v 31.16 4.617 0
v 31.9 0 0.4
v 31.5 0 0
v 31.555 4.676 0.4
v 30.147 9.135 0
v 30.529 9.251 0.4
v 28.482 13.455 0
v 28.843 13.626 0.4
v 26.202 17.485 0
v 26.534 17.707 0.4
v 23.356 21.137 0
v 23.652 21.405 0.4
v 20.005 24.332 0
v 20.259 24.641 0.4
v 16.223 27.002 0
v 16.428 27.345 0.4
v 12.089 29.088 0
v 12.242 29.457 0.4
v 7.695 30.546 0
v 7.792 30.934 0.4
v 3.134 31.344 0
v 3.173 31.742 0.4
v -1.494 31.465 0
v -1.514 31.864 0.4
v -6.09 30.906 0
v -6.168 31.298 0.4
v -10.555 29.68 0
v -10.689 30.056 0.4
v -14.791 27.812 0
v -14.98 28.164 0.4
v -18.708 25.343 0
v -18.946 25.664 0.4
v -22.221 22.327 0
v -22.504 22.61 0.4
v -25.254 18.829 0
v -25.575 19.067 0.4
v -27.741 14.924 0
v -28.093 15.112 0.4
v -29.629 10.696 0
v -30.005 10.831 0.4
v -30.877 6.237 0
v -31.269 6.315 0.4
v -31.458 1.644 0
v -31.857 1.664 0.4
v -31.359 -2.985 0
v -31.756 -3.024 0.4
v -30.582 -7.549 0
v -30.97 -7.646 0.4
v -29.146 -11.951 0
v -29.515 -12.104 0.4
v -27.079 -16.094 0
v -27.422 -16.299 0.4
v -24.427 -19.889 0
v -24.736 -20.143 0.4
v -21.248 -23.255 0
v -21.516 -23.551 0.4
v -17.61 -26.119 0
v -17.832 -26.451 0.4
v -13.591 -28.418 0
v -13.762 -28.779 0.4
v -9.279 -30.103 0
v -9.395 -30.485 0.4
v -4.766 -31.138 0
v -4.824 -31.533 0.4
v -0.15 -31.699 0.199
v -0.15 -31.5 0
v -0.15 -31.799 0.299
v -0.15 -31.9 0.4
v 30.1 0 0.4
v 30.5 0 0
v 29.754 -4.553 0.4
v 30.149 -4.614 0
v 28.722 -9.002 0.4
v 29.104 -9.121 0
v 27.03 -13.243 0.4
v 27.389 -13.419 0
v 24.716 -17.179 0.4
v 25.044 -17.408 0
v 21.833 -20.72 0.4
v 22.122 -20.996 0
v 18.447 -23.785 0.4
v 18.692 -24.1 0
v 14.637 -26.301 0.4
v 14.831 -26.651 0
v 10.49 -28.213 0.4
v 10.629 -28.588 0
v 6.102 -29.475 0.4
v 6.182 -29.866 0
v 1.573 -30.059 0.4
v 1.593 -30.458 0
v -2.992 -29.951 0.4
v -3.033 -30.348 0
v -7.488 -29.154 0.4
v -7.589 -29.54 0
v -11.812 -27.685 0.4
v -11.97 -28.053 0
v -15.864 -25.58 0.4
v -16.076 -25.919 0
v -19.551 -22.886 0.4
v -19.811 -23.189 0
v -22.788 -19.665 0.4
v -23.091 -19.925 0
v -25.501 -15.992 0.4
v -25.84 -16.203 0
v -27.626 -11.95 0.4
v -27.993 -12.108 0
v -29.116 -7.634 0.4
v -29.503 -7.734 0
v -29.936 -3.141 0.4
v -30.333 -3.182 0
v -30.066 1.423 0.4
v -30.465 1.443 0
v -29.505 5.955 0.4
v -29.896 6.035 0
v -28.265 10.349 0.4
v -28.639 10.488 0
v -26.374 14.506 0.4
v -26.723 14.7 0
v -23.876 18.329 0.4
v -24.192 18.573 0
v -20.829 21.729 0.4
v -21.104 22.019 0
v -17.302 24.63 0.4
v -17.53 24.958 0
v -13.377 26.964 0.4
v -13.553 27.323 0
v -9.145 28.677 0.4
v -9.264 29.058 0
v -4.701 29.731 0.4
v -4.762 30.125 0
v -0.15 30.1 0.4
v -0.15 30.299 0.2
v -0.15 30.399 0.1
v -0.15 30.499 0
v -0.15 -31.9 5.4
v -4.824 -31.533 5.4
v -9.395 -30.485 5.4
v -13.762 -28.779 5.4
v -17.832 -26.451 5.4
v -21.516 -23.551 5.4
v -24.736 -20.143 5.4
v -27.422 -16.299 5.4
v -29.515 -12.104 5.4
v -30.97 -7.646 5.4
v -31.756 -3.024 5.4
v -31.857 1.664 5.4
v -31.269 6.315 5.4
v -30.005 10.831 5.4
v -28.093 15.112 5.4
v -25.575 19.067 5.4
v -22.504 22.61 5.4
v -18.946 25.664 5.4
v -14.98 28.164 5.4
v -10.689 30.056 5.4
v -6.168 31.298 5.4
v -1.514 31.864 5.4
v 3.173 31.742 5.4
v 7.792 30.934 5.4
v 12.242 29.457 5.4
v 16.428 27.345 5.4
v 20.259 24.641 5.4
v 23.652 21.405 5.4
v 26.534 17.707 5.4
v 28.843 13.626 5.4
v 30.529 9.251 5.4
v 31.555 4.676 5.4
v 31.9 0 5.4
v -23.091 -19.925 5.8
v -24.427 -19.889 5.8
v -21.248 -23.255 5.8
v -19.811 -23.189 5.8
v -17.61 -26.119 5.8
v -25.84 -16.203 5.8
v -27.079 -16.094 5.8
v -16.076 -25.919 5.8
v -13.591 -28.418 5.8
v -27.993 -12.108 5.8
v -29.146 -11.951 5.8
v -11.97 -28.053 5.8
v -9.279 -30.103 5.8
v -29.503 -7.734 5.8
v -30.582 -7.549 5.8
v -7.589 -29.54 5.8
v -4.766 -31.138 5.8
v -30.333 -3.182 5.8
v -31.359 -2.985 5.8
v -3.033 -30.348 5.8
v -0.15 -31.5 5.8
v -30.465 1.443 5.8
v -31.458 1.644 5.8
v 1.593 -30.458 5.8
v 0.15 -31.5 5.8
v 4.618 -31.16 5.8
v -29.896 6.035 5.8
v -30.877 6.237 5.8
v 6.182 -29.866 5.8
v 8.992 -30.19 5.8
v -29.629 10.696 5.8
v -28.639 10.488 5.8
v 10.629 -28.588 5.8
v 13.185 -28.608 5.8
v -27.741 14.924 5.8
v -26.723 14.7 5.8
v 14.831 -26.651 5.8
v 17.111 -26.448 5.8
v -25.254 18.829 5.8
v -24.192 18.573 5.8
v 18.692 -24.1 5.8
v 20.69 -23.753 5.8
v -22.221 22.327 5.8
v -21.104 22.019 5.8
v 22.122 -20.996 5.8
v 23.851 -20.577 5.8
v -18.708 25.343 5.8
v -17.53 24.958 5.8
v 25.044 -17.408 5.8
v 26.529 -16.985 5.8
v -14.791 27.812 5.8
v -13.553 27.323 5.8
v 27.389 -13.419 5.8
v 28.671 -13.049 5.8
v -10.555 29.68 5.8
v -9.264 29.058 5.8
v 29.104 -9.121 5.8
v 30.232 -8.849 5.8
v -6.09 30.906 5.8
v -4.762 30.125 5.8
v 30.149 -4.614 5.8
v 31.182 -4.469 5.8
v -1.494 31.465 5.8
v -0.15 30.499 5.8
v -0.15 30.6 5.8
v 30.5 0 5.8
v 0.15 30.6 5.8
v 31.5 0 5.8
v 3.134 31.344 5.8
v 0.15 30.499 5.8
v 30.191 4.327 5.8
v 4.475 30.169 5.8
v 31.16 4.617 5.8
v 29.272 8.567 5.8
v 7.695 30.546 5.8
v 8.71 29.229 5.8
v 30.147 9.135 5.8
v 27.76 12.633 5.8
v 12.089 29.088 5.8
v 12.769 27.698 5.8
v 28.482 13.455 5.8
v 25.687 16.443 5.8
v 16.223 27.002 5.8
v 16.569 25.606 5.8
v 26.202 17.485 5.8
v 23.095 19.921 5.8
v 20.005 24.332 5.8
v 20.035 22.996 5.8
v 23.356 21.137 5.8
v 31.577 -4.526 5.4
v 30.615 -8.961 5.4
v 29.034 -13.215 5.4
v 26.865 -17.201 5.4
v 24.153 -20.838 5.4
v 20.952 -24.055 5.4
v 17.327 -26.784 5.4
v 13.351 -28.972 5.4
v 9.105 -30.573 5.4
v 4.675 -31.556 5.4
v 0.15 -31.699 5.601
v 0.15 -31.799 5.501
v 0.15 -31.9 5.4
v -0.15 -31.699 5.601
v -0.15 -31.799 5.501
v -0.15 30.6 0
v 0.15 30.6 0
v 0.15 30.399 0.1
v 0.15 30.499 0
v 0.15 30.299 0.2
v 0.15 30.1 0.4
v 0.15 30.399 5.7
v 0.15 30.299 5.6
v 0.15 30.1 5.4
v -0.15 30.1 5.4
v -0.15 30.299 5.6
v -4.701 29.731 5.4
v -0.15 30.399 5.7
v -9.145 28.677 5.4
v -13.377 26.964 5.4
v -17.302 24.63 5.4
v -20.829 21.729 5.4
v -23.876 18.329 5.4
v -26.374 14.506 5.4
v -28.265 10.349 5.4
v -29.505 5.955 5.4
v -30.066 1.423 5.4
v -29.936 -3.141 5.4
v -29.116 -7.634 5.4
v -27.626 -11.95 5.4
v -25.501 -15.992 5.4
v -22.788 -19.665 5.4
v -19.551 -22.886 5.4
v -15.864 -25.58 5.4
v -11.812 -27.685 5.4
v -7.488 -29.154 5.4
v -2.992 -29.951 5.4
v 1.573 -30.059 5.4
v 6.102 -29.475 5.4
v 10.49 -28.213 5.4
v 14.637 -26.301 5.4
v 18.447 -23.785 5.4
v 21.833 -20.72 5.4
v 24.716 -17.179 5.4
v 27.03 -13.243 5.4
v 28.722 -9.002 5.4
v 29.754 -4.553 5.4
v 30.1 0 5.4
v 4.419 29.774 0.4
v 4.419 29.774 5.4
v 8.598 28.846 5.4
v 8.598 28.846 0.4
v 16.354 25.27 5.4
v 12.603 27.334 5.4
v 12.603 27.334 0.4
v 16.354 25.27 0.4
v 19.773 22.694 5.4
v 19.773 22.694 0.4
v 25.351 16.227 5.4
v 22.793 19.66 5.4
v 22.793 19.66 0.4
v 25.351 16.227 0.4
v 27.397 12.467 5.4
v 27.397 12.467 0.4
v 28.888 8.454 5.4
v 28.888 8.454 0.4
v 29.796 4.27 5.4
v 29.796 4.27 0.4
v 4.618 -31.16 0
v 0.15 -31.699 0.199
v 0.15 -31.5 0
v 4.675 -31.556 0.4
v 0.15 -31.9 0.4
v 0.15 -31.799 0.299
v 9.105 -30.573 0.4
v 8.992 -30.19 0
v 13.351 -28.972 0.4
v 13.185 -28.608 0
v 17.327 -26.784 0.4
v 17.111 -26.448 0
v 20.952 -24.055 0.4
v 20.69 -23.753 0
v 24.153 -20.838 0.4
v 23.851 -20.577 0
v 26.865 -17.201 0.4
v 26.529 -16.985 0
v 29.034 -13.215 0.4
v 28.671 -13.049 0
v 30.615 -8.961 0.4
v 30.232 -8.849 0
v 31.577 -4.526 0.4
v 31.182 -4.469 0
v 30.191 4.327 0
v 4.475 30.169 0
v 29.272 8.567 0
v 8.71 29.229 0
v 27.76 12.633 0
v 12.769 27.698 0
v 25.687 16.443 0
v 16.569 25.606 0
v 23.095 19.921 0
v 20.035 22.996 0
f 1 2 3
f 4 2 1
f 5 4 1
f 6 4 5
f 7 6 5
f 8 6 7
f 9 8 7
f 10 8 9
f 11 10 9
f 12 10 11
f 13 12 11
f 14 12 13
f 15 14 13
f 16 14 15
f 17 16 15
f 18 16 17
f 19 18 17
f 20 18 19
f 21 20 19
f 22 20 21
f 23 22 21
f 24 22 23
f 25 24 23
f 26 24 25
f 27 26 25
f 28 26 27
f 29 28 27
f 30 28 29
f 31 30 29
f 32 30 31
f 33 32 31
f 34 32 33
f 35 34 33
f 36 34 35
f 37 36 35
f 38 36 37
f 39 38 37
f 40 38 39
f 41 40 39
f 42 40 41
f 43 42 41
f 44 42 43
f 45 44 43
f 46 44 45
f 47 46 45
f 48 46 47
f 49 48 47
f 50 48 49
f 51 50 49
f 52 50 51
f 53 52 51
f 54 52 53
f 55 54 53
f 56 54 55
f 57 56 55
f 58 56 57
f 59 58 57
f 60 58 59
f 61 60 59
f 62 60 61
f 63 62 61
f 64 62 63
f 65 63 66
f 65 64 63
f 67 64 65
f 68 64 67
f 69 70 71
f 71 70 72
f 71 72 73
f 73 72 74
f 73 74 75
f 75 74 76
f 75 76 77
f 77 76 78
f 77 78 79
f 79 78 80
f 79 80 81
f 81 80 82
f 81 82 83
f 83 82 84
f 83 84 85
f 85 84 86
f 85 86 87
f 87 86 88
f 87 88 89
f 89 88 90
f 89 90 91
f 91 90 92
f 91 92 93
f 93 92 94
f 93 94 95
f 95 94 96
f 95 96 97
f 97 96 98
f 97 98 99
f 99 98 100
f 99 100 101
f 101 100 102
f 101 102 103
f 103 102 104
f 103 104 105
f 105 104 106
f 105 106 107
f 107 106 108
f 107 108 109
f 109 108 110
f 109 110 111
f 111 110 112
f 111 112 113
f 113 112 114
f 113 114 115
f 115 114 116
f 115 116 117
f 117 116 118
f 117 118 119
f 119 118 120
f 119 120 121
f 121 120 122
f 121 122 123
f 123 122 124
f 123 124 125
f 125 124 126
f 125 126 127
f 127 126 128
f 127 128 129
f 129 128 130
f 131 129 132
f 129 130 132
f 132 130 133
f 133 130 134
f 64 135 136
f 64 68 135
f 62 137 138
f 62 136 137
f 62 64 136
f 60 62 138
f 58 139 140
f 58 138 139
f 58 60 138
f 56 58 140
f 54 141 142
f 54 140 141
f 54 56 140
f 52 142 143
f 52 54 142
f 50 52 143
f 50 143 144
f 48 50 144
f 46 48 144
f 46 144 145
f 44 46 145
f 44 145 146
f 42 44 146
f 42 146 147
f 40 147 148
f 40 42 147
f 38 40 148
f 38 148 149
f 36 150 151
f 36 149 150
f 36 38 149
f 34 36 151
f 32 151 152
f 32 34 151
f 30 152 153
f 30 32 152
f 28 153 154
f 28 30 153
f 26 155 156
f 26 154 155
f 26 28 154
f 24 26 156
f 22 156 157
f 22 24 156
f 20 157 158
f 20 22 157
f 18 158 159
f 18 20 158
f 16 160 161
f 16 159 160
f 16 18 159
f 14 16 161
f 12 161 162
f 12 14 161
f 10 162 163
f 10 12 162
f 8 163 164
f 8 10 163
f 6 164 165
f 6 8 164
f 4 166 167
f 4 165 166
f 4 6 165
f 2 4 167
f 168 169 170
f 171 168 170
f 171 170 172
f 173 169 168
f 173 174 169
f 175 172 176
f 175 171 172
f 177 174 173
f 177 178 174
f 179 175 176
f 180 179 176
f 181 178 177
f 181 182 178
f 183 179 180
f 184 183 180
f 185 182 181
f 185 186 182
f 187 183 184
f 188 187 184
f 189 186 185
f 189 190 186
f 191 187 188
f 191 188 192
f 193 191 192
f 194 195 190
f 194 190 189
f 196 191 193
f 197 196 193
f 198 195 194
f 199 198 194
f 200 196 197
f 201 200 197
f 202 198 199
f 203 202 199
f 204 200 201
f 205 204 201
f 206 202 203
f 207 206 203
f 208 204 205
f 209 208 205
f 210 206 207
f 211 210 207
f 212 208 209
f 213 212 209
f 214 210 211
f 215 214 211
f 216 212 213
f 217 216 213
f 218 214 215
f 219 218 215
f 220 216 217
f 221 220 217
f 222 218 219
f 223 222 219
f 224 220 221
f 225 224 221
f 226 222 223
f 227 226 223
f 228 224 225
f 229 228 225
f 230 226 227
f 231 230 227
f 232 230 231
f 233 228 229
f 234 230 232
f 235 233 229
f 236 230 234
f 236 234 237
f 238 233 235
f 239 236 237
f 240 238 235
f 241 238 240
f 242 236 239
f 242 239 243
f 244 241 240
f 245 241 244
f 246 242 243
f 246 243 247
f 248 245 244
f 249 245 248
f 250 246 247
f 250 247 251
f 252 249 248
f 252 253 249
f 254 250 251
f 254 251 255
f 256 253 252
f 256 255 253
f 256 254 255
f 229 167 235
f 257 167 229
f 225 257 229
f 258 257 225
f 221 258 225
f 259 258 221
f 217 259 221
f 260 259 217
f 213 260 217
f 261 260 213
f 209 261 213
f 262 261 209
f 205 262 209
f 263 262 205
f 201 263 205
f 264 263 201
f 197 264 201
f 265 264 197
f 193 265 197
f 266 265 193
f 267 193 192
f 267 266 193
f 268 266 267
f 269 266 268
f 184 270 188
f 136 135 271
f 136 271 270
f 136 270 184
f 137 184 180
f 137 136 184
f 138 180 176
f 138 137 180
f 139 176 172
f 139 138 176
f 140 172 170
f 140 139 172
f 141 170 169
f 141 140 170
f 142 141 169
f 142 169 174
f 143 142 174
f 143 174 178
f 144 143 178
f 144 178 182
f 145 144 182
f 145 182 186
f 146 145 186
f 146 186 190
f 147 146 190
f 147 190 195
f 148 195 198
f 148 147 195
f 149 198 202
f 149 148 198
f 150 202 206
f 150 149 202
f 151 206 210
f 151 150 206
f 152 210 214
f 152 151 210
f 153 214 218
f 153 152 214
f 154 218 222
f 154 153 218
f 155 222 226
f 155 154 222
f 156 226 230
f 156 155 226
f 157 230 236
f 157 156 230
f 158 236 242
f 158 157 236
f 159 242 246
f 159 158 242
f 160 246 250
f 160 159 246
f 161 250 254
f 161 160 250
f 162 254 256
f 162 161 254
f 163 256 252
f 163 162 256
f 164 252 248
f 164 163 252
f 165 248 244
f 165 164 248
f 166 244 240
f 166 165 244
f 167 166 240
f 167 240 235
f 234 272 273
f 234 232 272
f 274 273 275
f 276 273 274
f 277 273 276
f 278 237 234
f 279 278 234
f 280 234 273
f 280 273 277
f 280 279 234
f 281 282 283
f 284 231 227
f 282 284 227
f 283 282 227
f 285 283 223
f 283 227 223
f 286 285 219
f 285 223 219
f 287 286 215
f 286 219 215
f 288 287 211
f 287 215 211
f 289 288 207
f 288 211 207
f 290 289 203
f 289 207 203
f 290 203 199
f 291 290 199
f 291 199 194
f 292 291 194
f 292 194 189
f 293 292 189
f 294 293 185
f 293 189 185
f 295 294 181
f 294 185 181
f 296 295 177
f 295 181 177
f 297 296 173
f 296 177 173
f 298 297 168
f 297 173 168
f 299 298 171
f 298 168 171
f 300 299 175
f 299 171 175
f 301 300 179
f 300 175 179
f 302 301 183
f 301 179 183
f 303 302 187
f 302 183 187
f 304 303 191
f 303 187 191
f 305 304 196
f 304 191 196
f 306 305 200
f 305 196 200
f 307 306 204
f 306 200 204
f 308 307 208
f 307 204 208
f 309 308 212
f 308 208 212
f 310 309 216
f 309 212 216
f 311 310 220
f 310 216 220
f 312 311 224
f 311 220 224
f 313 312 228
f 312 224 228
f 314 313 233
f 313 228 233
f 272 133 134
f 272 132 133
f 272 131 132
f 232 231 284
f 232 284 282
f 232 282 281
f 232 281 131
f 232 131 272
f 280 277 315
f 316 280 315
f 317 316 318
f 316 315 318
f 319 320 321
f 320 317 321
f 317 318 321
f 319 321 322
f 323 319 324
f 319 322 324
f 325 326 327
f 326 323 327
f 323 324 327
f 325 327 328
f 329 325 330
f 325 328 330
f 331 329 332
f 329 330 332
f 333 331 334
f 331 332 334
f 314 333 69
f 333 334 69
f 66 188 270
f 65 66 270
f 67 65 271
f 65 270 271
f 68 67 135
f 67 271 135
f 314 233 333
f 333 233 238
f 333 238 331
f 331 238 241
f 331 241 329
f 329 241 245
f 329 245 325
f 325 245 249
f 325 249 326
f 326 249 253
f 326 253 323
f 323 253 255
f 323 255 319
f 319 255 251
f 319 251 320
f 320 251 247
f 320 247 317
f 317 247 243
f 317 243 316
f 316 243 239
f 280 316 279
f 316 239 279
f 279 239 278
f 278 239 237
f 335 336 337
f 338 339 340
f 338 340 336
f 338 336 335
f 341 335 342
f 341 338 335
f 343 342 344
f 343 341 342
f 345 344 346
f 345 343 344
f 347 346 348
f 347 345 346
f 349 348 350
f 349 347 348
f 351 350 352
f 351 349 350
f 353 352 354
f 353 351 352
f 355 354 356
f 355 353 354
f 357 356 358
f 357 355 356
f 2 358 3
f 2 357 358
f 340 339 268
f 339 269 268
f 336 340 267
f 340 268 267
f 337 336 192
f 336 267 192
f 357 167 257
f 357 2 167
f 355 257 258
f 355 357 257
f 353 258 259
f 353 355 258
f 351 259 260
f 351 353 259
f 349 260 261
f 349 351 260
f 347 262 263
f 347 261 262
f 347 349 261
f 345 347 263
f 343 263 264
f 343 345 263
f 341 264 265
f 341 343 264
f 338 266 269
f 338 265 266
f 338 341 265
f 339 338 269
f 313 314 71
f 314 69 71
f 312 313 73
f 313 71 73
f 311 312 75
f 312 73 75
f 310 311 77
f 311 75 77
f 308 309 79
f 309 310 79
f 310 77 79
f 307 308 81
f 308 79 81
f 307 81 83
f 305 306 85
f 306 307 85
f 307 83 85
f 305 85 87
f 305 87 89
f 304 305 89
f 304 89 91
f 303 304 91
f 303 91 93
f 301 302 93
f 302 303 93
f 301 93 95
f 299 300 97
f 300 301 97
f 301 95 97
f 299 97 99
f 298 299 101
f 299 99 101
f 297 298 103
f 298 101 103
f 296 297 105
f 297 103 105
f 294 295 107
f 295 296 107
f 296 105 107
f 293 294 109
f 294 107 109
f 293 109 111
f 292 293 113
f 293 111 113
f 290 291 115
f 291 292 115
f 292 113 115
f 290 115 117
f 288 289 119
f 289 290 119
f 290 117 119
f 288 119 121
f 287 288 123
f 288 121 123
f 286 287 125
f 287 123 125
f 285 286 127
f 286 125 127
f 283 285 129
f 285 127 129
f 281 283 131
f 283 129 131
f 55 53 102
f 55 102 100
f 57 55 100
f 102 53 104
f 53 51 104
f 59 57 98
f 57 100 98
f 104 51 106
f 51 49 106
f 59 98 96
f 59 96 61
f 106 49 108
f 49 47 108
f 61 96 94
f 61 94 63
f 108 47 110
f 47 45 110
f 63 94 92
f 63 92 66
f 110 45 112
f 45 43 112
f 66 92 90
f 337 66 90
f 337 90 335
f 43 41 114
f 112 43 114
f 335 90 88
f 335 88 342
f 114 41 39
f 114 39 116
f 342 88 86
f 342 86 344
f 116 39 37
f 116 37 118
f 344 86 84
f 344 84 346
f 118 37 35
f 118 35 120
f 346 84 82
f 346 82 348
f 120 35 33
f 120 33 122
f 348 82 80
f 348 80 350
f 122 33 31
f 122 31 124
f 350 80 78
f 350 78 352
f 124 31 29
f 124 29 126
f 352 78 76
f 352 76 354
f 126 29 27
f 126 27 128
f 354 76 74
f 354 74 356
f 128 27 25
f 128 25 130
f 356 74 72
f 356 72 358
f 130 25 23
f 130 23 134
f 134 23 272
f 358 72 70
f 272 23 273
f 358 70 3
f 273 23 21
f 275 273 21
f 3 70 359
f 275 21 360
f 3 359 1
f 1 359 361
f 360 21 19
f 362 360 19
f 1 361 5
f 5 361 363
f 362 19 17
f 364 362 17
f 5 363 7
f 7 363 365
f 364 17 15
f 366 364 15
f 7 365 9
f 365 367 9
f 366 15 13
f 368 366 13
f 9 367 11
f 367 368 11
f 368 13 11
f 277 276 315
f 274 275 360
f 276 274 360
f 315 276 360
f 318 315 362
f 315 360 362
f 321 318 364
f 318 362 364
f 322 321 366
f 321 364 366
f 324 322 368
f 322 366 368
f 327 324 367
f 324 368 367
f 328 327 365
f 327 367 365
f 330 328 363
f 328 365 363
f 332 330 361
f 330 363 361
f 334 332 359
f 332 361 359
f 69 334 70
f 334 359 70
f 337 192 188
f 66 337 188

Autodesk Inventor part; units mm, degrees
ref_plane "YZ Plane" through (0, 0, 0) normal (1, 0, 0) x (0, 1, 0)
ref_plane "XZ Plane" through (0, 0, 0) normal (0, 1, 0) x (-1, 0, 0)
ref_plane "XY Plane" through (0, 0, 0) normal (0, 0, 1) x (1, 0, 0)
sketch "Sketch1" plane through (0, 0, 0) normal (0, 0, 1) x (1, 0, 0)
  circle A0 centre (0, 0) radius 30.1
  circle A1 centre (0, 0) radius 31.9
  dimension "d0" = 60.2
  dimension "d1" = 63.8
extrude "Extrusion1" add sketch "Sketch1" along normal blind 5.8
sketch "Sketch2" plane through (0, 0, 5.8) normal (0, 0, 1) x (1, 0, 0)
  line L0 (-0.15, 30.6) -> (0.15, 30.6)
  line L1 (0.15, 30.6) -> (0.15, 28.6)
  line L2 (0.15, 28.6) -> (-0.15, 28.6)
  line L3 (-0.15, 28.6) -> (-0.15, 30.6)
  line L4 (-0.15, -33.5) -> (0.15, -33.5)
  line L5 (0.15, -33.5) -> (0.15, -31.5)
  line L6 (0.15, -31.5) -> (-0.15, -31.5)
  line L7 (-0.15, -31.5) -> (-0.15, -33.5)
  point P0 (0, 0)
  point P1 (0, 28.6)
  point P2 (0, -31.5)
  dimension "d7" = 30.6
  dimension "d8" = 0.3
  dimension "d9" = 2
  dimension "d10" = 31.5
  dimension "d11" = 2
extrude "Extrusion2" cut sketch "Sketch2" against normal through all
chamfer "Chamfer1" distance 0.4 angle 45 8 edges at (-22.5036, 22.6097, 5.8) (22.6097, -22.5036, 5.8) (21.3369, 21.2308, 5.8) (-21.2308, -21.3369, 5.8) (-22.5036, 22.6097, 0) (22.6097, -22.5036, 0) (21.3369, 21.2308, 0) (-21.2308, -21.3369, 0)
properties part number "light-seam" material "ABS Plastic"
